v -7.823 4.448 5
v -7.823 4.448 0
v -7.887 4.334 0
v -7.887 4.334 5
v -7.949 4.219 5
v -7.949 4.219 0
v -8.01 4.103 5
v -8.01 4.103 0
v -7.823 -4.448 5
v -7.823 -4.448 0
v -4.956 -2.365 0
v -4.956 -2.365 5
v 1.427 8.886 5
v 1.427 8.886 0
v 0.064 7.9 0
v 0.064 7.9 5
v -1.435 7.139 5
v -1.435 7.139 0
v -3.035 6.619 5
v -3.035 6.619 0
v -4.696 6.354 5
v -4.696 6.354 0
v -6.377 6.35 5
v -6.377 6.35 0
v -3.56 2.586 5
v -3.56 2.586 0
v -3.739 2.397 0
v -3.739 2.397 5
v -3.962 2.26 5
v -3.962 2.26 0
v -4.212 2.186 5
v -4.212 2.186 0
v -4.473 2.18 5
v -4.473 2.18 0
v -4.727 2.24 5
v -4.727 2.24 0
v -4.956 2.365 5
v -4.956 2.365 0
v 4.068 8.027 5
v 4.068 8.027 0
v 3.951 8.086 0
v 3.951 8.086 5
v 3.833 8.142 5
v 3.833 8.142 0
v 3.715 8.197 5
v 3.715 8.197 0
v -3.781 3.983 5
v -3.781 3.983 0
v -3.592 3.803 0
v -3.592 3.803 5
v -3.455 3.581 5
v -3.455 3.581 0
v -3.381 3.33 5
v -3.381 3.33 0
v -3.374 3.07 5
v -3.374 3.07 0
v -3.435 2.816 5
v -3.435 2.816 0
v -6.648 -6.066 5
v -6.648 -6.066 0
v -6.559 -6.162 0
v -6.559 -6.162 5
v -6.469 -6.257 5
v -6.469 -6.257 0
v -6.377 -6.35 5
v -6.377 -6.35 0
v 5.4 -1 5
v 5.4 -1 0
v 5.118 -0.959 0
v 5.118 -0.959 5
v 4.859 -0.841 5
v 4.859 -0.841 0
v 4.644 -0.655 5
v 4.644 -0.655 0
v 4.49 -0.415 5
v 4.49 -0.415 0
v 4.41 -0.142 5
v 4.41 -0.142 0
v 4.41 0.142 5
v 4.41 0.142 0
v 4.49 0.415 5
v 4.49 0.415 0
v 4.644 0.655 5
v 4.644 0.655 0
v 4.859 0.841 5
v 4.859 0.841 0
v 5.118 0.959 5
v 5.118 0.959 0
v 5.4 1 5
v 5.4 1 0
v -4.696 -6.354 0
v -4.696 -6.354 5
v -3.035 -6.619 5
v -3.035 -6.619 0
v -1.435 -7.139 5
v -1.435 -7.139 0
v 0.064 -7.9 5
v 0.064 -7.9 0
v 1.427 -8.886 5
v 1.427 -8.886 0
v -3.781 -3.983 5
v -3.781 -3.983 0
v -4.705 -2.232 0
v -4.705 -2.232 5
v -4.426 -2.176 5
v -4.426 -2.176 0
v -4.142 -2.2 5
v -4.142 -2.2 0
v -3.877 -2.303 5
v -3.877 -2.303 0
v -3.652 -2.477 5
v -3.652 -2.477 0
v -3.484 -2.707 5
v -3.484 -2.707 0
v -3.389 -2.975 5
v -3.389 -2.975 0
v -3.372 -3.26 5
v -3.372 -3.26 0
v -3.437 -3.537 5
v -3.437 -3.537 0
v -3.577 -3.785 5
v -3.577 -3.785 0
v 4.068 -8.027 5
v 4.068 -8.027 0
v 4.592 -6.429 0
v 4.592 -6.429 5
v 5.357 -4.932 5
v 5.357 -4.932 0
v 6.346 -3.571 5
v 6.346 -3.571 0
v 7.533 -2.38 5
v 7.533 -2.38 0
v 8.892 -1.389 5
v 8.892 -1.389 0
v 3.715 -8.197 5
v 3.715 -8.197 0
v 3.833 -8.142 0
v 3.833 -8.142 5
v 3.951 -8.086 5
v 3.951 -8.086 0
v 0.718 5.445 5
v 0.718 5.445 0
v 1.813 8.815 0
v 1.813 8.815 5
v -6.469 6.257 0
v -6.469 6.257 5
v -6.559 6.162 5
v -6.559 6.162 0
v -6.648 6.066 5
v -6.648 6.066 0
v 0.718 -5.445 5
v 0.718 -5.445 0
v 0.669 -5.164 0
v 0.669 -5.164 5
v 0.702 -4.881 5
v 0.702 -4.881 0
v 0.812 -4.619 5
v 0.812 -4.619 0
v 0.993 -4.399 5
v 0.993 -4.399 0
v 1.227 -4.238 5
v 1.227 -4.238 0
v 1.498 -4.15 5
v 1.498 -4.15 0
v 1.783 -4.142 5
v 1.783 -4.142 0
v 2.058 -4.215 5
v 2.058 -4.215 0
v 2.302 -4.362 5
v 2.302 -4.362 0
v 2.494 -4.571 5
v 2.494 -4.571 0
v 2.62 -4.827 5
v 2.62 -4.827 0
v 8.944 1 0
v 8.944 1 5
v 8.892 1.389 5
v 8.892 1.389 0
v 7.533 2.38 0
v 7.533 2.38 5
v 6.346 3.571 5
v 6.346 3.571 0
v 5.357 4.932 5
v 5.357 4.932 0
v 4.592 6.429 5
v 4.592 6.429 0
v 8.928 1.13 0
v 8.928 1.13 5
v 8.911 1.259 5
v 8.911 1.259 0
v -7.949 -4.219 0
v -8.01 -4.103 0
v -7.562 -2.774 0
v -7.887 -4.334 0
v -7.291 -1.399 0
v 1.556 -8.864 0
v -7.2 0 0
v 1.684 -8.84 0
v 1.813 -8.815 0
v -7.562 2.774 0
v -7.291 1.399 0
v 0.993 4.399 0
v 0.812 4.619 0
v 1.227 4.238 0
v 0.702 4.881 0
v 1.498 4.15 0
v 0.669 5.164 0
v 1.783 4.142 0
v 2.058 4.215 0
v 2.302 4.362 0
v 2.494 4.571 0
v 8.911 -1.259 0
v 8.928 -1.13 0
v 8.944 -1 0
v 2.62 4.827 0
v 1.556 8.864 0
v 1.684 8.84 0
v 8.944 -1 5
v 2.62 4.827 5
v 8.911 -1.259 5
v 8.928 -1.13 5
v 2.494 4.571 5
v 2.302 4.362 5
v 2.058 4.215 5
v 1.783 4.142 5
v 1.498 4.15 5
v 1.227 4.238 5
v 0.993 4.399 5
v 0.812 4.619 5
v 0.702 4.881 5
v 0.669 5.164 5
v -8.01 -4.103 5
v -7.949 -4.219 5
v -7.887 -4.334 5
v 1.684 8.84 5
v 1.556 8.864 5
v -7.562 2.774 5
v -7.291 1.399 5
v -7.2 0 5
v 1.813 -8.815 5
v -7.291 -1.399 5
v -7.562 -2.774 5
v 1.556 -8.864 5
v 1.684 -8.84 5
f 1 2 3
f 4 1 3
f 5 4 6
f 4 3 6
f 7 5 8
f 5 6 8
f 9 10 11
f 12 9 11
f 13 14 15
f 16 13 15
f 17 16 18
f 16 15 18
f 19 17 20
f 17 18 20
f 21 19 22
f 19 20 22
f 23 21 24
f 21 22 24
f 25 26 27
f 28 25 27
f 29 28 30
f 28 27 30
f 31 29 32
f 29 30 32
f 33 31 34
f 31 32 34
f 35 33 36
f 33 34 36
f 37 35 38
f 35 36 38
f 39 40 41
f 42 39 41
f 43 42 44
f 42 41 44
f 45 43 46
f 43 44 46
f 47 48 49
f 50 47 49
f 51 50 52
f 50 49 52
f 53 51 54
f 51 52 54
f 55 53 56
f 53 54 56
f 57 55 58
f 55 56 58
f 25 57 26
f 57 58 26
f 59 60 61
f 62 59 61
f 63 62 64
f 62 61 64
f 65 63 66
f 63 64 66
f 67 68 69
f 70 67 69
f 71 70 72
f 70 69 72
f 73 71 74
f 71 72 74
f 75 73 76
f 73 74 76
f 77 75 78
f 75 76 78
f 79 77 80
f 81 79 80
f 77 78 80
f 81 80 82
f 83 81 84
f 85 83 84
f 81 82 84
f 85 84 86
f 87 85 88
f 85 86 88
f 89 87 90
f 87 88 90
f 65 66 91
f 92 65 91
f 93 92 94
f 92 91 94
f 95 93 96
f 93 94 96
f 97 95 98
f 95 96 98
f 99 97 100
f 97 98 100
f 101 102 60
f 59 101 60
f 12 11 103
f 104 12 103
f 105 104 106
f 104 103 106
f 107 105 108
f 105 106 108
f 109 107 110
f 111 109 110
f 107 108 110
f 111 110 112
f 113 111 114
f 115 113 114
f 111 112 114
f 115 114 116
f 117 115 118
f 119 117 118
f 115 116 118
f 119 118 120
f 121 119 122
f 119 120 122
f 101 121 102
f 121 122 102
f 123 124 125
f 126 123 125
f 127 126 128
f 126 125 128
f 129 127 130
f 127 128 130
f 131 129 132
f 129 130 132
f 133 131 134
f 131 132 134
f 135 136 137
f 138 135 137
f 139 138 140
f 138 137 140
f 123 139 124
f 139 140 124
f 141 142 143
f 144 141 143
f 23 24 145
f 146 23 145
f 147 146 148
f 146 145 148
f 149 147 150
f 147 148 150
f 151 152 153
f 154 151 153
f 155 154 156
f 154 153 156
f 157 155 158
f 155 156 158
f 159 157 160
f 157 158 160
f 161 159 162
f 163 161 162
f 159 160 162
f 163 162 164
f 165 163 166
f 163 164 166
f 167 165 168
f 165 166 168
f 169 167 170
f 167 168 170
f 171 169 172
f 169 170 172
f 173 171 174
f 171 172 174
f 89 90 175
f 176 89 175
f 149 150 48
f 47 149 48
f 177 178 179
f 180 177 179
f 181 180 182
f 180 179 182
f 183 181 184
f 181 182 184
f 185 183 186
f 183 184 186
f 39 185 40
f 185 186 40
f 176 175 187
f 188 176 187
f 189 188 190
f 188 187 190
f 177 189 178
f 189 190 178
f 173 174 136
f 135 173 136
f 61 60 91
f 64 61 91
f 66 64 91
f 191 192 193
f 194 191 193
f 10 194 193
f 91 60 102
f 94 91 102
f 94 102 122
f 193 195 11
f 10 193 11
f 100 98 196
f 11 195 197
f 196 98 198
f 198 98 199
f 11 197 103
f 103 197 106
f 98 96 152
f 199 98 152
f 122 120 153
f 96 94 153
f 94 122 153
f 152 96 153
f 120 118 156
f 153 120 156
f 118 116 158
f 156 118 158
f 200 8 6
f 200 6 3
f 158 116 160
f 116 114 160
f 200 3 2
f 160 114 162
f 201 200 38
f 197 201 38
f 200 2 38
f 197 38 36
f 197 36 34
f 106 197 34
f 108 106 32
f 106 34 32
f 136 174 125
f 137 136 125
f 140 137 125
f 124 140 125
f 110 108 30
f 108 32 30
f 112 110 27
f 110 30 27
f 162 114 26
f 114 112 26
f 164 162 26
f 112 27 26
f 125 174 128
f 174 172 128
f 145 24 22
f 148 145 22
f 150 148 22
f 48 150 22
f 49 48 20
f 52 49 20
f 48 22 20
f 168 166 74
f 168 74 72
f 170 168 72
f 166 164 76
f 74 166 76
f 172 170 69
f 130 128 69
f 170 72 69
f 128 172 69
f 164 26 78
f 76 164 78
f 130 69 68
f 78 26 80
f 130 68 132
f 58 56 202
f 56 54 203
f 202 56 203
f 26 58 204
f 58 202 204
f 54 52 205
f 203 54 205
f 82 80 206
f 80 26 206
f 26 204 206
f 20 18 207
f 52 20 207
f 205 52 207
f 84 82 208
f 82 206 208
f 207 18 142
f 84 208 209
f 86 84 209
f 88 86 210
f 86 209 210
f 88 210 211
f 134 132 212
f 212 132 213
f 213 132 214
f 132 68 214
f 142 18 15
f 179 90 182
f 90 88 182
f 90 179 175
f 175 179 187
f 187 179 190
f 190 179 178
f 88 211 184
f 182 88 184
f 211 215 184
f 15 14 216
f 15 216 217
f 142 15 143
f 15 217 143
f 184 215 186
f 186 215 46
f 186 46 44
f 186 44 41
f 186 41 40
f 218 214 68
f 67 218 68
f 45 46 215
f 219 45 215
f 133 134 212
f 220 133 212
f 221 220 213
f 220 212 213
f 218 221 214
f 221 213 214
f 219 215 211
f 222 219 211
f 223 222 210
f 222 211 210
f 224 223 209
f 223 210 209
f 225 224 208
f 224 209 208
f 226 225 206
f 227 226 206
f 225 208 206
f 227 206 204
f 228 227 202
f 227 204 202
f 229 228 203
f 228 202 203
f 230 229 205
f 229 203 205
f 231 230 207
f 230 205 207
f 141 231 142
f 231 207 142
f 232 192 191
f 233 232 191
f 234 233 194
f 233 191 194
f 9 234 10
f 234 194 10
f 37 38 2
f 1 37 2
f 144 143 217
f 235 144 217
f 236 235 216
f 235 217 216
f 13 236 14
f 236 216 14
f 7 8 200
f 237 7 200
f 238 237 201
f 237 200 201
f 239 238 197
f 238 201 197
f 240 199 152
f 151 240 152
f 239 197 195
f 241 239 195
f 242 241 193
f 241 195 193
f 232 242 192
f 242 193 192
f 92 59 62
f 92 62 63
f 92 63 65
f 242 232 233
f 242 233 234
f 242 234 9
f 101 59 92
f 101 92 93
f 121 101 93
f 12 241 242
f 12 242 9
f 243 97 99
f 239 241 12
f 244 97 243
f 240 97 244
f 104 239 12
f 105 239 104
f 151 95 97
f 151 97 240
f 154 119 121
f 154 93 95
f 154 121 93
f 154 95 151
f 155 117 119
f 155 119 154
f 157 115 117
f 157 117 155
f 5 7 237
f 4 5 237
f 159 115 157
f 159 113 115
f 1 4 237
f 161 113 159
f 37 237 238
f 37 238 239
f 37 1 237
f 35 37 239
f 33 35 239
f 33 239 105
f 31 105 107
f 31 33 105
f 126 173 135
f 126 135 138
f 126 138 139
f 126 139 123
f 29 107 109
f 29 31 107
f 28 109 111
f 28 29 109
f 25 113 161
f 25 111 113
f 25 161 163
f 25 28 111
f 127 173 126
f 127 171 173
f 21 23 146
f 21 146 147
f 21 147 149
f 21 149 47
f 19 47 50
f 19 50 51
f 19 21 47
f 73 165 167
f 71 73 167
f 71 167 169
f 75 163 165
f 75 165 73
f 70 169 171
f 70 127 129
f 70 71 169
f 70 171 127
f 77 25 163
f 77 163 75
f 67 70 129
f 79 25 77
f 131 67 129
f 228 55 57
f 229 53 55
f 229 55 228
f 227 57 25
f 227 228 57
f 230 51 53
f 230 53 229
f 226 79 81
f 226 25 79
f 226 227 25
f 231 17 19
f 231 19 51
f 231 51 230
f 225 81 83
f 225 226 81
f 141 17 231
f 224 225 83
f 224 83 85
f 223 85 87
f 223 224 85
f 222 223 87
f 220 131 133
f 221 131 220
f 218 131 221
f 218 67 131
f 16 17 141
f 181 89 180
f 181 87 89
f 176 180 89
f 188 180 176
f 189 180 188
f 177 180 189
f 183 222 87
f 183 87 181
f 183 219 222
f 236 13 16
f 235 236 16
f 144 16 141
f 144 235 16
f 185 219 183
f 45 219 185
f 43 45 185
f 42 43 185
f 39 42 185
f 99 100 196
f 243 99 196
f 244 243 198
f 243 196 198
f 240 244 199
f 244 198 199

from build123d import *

# Parameters (mm, degrees)
SALIENTE_EXTRUIR1_DEPTH = 5


with BuildPart() as part:
    # Croquis1 → Saliente-Extruir1 (new body)
    with BuildSketch(Plane.XY):
        with BuildLine():
            ThreePointArc((-3.559674775, 2.58625511), (-4.212257305, 2.186352022), (-4.956477022, 2.365023368))
            Line((-4.956477022, 2.365023368), (-7.823412697, 4.447974061))
            ThreePointArc((-7.823412697, 4.447974061), (-7.918450076, 4.276494812), (-8.00972943, 4.102985978))
            ThreePointArc((-8.00972943, 4.102985978), (-7.404365943, 2.091061673), (-7.2, 0))
            ThreePointArc((-7.2, 0), (-7.404365943, -2.091061673), (-8.00972943, -4.102985978))
            ThreePointArc((-8.00972943, -4.102985978), (-7.918450076, -4.276494812), (-7.823412697, -4.447974061))
            Line((-7.823412697, -4.447974061), (-4.956477022, -2.365023368))
            ThreePointArc((-4.956477022, -2.365023368), (-3.559674775, -2.58625511), (-3.780906517, -3.983057357))
            Line((-3.780906517, -3.983057357), (-6.647842193, -6.06600805))
            ThreePointArc((-6.647842193, -6.06600805), (-6.514123901, -6.20938397), (-6.377314065, -6.349812973))
            ThreePointArc((-6.377314065, -6.349812973), (-2.224922359, -6.847606917), (1.427029037, -8.885597763))
            ThreePointArc((1.427029037, -8.885597763), (1.620252616, -8.852403117), (1.812707238, -8.815007201))
            Line((1.812707238, -8.815007201), (0.717635253, -5.444722182))
            ThreePointArc((0.717635253, -5.444722182), (1.359674775, -4.184648672), (2.619748286, -4.826688194))
            Line((2.619748286, -4.826688194), (3.71482027, -8.196973212))
            ThreePointArc((3.71482027, -8.196973212), (3.892500098, -8.114105155), (4.068332581, -8.027386218))
            ThreePointArc((4.068332581, -8.027386218), (5.824922359, -4.232053817), (8.891681878, -1.38861545))
            ThreePointArc((8.891681878, -1.38861545), (8.919821263, -1.194591196), (8.943727382, -1))
            Line((8.943727382, -1), (5.4, -1))
            ThreePointArc((5.4, -1), (4.4, 0), (5.4, 1))
            Line((5.4, 1), (8.943727382, 1))
            ThreePointArc((8.943727382, 1), (8.919821263, 1.194591196), (8.891681878, 1.38861545))
            ThreePointArc((8.891681878, 1.38861545), (5.824922359, 4.232053817), (4.068332581, 8.027386218))
            ThreePointArc((4.068332581, 8.027386218), (3.892500098, 8.114105155), (3.71482027, 8.196973212))
            Line((3.71482027, 8.196973212), (2.619748286, 4.826688194))
            ThreePointArc((2.619748286, 4.826688194), (1.359674775, 4.184648672), (0.717635253, 5.444722182))
            Line((0.717635253, 5.444722182), (1.812707238, 8.815007201))
            ThreePointArc((1.812707238, 8.815007201), (1.620252616, 8.852403117), (1.427029037, 8.885597763))
            ThreePointArc((1.427029037, 8.885597763), (-2.224922359, 6.847606917), (-6.377314065, 6.349812973))
            ThreePointArc((-6.377314065, 6.349812973), (-6.514123901, 6.20938397), (-6.647842193, 6.06600805))
            Line((-6.647842193, 6.06600805), (-3.780906517, 3.983057357))
            ThreePointArc((-3.780906517, 3.983057357), (-3.381003429, 3.330474827), (-3.559674775, 2.58625511))
        make_face()
    extrude(amount=SALIENTE_EXTRUIR1_DEPTH)


solid = part.part
